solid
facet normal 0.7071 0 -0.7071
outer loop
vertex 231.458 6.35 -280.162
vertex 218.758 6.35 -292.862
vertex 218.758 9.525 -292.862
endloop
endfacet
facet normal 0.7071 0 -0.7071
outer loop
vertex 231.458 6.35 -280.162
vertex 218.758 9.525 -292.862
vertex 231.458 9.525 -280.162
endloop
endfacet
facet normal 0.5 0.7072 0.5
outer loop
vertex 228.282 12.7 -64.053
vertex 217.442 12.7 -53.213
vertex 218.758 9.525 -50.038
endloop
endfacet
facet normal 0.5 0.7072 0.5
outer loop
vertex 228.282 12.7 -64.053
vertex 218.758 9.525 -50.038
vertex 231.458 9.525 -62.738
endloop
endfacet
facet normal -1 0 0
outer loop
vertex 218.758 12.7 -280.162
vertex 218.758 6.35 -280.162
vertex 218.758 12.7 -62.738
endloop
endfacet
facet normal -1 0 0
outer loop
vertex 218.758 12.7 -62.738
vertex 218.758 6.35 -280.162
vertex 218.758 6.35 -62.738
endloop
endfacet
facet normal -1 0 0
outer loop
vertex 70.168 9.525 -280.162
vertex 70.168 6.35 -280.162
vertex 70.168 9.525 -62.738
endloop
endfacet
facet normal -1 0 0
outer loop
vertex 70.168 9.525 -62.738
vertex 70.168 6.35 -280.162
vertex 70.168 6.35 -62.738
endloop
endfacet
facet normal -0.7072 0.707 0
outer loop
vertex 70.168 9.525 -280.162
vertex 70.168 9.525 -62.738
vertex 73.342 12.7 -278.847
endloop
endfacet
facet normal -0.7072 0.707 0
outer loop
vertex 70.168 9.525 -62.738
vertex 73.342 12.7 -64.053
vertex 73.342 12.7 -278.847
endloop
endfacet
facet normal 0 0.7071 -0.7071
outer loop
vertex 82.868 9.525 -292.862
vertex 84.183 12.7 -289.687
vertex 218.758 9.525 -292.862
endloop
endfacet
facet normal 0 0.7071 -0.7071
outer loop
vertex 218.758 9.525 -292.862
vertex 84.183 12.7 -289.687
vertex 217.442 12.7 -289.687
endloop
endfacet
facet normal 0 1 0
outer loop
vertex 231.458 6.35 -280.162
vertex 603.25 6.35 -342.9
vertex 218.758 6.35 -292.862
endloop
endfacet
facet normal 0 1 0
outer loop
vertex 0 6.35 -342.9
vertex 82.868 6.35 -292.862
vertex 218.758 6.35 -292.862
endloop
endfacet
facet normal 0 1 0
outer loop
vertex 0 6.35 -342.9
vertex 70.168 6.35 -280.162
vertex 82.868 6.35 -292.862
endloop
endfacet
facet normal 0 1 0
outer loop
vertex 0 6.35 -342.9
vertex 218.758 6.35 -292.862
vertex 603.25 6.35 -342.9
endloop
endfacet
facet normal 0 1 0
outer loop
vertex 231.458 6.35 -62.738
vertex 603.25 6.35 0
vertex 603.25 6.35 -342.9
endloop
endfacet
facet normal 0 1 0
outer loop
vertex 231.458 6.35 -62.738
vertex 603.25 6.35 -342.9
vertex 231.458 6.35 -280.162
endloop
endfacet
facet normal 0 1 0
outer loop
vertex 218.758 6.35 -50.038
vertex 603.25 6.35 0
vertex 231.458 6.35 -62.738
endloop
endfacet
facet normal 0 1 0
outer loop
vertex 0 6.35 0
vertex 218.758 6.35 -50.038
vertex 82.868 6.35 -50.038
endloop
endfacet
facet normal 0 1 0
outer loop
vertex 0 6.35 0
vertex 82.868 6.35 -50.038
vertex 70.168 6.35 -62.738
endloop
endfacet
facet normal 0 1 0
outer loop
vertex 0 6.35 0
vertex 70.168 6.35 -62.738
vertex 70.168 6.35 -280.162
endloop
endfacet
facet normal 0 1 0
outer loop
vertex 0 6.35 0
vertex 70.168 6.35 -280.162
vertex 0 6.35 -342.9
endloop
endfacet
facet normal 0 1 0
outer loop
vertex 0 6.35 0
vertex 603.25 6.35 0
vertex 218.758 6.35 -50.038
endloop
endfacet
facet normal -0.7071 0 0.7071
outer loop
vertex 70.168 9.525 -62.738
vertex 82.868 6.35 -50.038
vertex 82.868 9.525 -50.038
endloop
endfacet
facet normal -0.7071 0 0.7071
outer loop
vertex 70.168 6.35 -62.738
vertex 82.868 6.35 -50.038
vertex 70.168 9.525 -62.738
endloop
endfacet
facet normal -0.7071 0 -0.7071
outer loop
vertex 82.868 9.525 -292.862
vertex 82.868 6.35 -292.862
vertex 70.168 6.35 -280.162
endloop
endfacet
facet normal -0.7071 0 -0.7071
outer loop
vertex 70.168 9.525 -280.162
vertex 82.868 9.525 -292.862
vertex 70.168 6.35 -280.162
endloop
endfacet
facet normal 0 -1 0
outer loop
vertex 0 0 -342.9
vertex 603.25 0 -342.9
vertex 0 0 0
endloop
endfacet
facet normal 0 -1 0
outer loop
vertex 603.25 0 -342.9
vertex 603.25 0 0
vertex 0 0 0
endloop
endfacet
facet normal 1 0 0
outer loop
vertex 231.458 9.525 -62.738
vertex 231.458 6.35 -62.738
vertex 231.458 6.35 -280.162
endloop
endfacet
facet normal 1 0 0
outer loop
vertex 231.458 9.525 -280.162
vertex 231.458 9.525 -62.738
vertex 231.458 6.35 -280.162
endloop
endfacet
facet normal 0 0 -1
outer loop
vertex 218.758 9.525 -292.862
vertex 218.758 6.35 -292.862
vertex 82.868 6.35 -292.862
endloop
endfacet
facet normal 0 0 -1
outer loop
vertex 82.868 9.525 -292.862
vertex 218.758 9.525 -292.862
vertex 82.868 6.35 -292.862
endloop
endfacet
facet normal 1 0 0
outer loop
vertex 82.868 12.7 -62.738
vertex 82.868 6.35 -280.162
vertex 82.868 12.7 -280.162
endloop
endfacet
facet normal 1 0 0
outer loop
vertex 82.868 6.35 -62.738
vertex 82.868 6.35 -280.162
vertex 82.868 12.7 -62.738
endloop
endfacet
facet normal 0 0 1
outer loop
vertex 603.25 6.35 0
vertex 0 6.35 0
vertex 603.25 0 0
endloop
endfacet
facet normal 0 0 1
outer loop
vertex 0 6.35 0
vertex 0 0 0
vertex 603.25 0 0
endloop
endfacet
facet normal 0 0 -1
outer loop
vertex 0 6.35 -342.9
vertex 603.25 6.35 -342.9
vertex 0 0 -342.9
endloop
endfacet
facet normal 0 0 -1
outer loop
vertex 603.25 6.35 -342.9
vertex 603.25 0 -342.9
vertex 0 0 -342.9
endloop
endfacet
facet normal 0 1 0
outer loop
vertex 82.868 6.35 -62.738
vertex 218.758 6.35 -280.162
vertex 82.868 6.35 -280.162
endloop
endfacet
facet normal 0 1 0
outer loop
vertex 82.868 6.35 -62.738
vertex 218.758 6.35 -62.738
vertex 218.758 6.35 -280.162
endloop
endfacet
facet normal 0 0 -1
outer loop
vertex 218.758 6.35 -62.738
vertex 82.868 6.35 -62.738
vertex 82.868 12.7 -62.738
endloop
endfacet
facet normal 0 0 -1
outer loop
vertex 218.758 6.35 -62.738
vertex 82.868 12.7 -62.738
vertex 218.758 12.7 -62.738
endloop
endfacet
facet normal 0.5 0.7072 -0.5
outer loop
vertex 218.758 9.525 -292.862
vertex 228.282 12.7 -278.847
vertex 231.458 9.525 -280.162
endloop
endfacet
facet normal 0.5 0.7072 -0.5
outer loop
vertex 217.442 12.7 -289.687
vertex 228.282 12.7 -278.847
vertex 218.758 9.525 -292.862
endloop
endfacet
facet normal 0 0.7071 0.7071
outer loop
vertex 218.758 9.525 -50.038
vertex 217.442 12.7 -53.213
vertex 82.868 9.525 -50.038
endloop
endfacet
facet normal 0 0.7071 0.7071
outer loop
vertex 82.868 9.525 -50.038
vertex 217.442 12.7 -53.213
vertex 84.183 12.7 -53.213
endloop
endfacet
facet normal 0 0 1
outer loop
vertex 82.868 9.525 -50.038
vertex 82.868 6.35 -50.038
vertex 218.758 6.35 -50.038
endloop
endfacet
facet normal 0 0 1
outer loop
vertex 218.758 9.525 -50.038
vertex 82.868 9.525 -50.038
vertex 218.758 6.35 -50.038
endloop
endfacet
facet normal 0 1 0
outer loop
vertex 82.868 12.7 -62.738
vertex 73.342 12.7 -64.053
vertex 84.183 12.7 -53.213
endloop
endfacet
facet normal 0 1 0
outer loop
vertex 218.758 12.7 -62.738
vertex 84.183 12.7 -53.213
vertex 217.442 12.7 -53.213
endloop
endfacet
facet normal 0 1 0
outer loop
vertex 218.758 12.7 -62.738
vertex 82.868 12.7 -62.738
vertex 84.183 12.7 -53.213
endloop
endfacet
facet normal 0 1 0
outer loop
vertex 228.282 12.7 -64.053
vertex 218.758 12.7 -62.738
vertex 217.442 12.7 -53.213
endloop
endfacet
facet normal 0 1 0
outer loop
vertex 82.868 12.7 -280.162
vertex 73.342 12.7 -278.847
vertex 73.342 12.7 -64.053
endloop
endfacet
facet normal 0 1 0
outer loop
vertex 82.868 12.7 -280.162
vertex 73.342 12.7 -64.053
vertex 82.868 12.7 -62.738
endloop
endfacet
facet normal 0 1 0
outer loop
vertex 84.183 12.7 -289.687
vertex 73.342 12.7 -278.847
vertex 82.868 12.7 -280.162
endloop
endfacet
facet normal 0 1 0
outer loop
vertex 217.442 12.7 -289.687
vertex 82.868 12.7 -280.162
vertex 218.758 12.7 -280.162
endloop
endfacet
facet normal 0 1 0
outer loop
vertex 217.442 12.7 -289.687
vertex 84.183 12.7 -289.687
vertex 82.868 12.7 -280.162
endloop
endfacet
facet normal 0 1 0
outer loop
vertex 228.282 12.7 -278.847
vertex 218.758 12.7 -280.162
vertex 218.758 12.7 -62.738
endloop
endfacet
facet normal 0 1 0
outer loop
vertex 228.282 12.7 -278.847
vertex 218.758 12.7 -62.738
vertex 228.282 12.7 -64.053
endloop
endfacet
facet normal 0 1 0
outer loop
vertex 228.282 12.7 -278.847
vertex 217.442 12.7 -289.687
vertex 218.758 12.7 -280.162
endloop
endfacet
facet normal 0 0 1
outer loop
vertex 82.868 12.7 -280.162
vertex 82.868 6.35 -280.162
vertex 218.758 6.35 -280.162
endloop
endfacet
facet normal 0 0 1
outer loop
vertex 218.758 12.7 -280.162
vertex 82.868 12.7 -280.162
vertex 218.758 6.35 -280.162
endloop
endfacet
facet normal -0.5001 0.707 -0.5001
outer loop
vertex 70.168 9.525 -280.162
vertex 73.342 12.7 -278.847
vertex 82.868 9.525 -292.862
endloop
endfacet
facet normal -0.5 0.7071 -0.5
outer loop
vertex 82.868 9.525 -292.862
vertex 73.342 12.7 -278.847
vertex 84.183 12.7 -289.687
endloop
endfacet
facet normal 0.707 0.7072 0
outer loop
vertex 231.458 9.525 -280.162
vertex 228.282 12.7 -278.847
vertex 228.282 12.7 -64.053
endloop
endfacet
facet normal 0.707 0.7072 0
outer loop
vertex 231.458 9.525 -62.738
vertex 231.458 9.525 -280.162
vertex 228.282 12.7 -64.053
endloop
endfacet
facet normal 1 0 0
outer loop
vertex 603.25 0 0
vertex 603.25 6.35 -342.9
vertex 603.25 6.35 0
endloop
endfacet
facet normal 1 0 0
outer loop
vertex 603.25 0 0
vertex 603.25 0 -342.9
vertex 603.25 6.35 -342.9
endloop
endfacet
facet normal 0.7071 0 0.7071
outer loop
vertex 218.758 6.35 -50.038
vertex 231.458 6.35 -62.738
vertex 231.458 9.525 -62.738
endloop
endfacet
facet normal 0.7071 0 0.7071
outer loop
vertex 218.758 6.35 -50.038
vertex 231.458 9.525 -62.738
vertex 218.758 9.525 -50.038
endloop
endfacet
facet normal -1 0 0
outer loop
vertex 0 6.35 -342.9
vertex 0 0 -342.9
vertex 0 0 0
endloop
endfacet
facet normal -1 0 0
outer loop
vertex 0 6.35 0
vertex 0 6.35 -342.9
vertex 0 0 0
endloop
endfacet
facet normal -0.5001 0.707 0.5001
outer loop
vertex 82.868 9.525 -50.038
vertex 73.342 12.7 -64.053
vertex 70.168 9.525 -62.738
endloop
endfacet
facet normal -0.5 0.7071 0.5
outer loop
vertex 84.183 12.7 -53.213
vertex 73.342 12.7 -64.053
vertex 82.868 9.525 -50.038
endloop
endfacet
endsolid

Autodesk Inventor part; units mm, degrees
ref_plane "YZ Plane" through (0, 0, 0) normal (1, 0, 0) x (0, 1, 0)
ref_plane "XZ Plane" through (0, 0, 0) normal (0, 1, 0) x (-1, 0, 0)
ref_plane "XY Plane" through (0, 0, 0) normal (0, 0, 1) x (1, 0, 0)
sketch "Sketch1" plane through (0, 0, 0) normal (0, 1, 0) x (-1, 0, 0)
  line L0 (0, 0) -> (-609.6, 0)
  line L1 (-609.6, 0) -> (-609.6, -342.9)
  line L2 (-609.6, -342.9) -> (0, -342.9)
  line L3 (0, -342.9) -> (0, 0)
  dimension "d0" = 609.6
  dimension "d1" = 342.9
  dimension "d2" = 609.6
extrude "Extrusion1" add sketch "Sketch1" along normal blind 6.35
sketch "Sketch2" plane through (0, 0, 0) normal (0, 1, 0) x (-1, 0, 0)
  line L0 (-609.6, -342.9) -> (0, -342.9) projected
  line L1 (0, 0) -> (-609.6, 0) projected
  line L2 (-609.6, -342.9) -> (-603.25, -342.9)
  line L3 (-603.25, -342.9) -> (-603.25, 0)
  line L4 (-603.25, 0) -> (-609.6, 0)
  line L5 (-609.6, 0) -> (-609.6, -342.9)
  dimension "d5" = 6.35
extrude "Extrusion2" cut sketch "Sketch2" along normal blind 231.775
sketch "Sketch3" plane through (0, 6.35, 0) normal (0, 1, 0) x (1, 0, 0)
  line L0 (603.25, 0) -> (603.25, 342.9) projected
  line L1 (0, 342.9) -> (0, 0) projected
  dimension "d8" = 603.25
sketch "Sketch4" plane through (0, 6.35, 0) normal (0, 1, 0) x (1, 0, 0)
  line L0 (603.25, 342.9) -> (0, 342.9) projected
  line L1 (0, 0) -> (603.25, 0) projected
  line L2 (0, 342.9) -> (0, 0) projected
  line L3 (0, 0) -> (301.625, 0)
  line L4 (301.625, 0) -> (301.625, 342.9)
  line L5 (301.625, 0) -> (452.4375, 0)
  line L6 (82.8675, 171.45) -> (82.8675, 280.162)
  line L7 (82.8675, 280.162) -> (150.8125, 280.162)
  line L8 (82.8675, 171.45) -> (82.8675, 62.738)
  line L9 (82.8675, 62.738) -> (150.8125, 62.738)
  line L10 (218.7575, 280.162) -> (150.8125, 280.162)
  line L11 (218.7575, 171.45) -> (218.7575, 280.162)
  line L12 (218.7575, 171.45) -> (218.7575, 62.738)
  line L13 (218.7575, 62.738) -> (150.8125, 62.738)
  line L14 (218.7575, 280.162) -> (218.7575, 292.862)
  line L15 (218.7575, 292.862) -> (82.8675, 292.862)
  line L16 (82.8675, 292.862) -> (82.8675, 280.162)
  line L17 (87.7385, 280.162) -> (75.0385, 280.162)
  line L18 (77.9965, 62.738) -> (87.7385, 62.738)
  line L19 (82.8675, 280.162) -> (70.1675, 280.162)
  line L20 (70.1675, 280.162) -> (70.1675, 62.738)
  line L21 (70.1675, 62.738) -> (82.8675, 62.738)
  line L22 (82.8675, 62.738) -> (82.8675, 50.038)
  line L23 (82.8675, 50.038) -> (218.7575, 50.038)
  line L24 (218.7575, 50.038) -> (218.7575, 62.738)
  line L25 (218.7575, 62.738) -> (231.4575, 62.738)
  line L26 (231.4575, 62.738) -> (231.4575, 280.162)
  line L27 (231.4575, 280.162) -> (218.7575, 280.162)
  line L28 (231.4575, 62.738) -> (218.7575, 50.038)
  line L29 (82.8675, 50.038) -> (70.1675, 62.738)
  line L30 (70.1675, 62.738) -> (70.1675, 280.162)
  line L31 (82.8675, 292.862) -> (70.1675, 280.162)
  line L32 (218.7575, 292.862) -> (231.4575, 280.162)
  dimension "d9" = 342.9
  dimension "d10" = 301.625
  dimension "d11" = 150.8125
extrude "Extrusion3" add sketch "Sketch4" along normal blind 6.35 contours L8 L18 L21 L20 L19 L17 L6 | L16 L15 L14 L10 L7 | L17 L19 L31 L16 | L22 L29 L21 L18 | L9 L13 L24 L23 L22 | L32 L27 L14 | L24 L25 L28 | L27 L26 L25 L12 L11
chamfer "Chamfer1" distance 3.175 angle 45 8 edges at (70.1675, 12.7, -171.45) (76.5175, 12.7, -286.512) (150.8125, 12.7, -292.862) (225.1075, 12.7, -286.512) (231.4575, 12.7, -171.45) (225.1075, 12.7, -56.388) (150.8125, 12.7, -50.038) (76.5175, 12.7, -56.388)
properties part number "UpperHalfofFrontBack_Ocampo"
